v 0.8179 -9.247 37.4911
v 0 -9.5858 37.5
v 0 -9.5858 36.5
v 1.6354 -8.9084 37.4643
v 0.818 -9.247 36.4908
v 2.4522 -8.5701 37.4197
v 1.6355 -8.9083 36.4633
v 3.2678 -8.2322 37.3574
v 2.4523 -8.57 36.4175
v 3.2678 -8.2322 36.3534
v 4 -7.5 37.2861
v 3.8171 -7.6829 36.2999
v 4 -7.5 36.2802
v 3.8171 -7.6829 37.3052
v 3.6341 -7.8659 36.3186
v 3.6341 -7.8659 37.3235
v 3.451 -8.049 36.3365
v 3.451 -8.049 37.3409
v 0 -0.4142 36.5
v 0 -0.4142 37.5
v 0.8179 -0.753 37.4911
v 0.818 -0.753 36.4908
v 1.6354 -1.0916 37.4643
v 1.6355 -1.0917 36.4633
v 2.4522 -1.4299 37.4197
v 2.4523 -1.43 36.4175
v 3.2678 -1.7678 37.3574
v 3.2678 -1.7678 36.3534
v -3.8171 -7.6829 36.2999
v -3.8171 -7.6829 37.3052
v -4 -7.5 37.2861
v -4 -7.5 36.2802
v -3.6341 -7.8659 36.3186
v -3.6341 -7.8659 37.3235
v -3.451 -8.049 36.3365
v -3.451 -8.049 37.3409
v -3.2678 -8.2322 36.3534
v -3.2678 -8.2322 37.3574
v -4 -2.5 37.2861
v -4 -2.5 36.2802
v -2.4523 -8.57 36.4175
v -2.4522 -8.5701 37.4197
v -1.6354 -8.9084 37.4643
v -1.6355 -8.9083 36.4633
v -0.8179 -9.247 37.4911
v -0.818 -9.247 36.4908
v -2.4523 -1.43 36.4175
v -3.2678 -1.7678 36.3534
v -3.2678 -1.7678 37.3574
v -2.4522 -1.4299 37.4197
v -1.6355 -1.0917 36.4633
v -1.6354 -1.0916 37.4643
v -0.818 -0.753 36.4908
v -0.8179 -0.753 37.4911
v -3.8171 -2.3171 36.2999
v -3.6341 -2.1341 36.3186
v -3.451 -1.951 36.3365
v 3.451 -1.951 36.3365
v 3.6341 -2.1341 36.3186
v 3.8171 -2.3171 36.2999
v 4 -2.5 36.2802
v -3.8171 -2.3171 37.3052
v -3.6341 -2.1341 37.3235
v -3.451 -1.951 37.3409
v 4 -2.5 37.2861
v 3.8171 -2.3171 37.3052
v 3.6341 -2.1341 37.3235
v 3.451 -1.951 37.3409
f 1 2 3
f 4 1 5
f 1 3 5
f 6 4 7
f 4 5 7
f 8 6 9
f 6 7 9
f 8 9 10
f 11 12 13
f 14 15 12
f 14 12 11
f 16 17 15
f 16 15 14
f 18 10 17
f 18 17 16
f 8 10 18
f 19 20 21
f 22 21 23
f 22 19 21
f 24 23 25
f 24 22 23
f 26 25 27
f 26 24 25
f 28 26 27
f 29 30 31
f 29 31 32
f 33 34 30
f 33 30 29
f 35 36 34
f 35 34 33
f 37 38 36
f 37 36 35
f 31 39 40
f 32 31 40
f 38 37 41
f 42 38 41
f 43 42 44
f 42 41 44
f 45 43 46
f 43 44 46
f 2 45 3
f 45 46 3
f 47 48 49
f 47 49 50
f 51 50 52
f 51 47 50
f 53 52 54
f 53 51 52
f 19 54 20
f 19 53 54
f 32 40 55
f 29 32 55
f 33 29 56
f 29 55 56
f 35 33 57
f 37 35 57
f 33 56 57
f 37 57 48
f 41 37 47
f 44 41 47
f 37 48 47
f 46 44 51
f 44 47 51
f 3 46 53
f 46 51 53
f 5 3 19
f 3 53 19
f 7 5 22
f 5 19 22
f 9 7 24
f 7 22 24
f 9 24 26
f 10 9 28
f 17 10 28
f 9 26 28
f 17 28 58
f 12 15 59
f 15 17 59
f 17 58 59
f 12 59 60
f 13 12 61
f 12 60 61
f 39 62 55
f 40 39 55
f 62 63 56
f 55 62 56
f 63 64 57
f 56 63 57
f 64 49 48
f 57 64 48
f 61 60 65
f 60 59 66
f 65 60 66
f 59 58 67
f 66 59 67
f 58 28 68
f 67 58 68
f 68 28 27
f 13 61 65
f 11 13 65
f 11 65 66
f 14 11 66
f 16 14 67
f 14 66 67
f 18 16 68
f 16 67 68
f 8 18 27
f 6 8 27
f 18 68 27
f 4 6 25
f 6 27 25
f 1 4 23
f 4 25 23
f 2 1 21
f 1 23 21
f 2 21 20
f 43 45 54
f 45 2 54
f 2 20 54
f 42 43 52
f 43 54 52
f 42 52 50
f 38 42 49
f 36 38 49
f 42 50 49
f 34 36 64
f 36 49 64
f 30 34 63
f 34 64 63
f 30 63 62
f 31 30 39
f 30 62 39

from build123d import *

# Parameters (mm, degrees)
F1_DEPTH    = 10
F2_SIZE     = 2.5
F3_T1_DEPTH = 13.9641748973


# Not quite as in the source:
# - a fillet or chamfer that OpenCascade refuses, or shapes differently, is made with other operations: its cross-section is extruded or revolved along the edge and cut away or added


with BuildPart() as f1:
    # F0 (on Front) → F1 (new body)
    with BuildSketch(Plane.XZ):
        with BuildLine():
            Line((4, 36.2801598673), (4, 37.286056375))
            ThreePointArc((4, 37.286056375), (0, 37.5), (-4, 37.286056375))
            Line((-4, 37.286056375), (-4, 36.2801598673))
            ThreePointArc((-4, 36.2801598673), (0, 36.5), (4, 36.2801598673))
        make_face()
    extrude(amount=F1_DEPTH)

    # F2
    f2_edges = [f1.edges().sort_by_distance(p)[0] for p in [
        (-4, -10, 36.783108),
        (-4, 0, 36.783108),
        (4, 0, 36.783108),
        (4, -10, 36.783108),
    ]]
    chamfer(f2_edges, length=F2_SIZE)

    # F3: chamfer of 2.5 on 4 edges, made by hand

    # F3_s2 → F3_t1 (cut)
    with BuildSketch(Plane.XY.offset(29.9874890754)):
        Polygon((-3.267766953, -8.232233047), (1, -10), (-1.5, -10), align=None)
        Polygon((-1, -10), (3.267766953, -8.232233047), (1.5, -10), align=None)
        Polygon((-3.267766953, -1.767766953), (1, 0), (-1.5, 0), align=None)
        Polygon((-1, 0), (3.267766953, -1.767766953), (1.5, 0), align=None)
    extrude(amount=F3_T1_DEPTH, mode=Mode.SUBTRACT)


solid = f1.part
